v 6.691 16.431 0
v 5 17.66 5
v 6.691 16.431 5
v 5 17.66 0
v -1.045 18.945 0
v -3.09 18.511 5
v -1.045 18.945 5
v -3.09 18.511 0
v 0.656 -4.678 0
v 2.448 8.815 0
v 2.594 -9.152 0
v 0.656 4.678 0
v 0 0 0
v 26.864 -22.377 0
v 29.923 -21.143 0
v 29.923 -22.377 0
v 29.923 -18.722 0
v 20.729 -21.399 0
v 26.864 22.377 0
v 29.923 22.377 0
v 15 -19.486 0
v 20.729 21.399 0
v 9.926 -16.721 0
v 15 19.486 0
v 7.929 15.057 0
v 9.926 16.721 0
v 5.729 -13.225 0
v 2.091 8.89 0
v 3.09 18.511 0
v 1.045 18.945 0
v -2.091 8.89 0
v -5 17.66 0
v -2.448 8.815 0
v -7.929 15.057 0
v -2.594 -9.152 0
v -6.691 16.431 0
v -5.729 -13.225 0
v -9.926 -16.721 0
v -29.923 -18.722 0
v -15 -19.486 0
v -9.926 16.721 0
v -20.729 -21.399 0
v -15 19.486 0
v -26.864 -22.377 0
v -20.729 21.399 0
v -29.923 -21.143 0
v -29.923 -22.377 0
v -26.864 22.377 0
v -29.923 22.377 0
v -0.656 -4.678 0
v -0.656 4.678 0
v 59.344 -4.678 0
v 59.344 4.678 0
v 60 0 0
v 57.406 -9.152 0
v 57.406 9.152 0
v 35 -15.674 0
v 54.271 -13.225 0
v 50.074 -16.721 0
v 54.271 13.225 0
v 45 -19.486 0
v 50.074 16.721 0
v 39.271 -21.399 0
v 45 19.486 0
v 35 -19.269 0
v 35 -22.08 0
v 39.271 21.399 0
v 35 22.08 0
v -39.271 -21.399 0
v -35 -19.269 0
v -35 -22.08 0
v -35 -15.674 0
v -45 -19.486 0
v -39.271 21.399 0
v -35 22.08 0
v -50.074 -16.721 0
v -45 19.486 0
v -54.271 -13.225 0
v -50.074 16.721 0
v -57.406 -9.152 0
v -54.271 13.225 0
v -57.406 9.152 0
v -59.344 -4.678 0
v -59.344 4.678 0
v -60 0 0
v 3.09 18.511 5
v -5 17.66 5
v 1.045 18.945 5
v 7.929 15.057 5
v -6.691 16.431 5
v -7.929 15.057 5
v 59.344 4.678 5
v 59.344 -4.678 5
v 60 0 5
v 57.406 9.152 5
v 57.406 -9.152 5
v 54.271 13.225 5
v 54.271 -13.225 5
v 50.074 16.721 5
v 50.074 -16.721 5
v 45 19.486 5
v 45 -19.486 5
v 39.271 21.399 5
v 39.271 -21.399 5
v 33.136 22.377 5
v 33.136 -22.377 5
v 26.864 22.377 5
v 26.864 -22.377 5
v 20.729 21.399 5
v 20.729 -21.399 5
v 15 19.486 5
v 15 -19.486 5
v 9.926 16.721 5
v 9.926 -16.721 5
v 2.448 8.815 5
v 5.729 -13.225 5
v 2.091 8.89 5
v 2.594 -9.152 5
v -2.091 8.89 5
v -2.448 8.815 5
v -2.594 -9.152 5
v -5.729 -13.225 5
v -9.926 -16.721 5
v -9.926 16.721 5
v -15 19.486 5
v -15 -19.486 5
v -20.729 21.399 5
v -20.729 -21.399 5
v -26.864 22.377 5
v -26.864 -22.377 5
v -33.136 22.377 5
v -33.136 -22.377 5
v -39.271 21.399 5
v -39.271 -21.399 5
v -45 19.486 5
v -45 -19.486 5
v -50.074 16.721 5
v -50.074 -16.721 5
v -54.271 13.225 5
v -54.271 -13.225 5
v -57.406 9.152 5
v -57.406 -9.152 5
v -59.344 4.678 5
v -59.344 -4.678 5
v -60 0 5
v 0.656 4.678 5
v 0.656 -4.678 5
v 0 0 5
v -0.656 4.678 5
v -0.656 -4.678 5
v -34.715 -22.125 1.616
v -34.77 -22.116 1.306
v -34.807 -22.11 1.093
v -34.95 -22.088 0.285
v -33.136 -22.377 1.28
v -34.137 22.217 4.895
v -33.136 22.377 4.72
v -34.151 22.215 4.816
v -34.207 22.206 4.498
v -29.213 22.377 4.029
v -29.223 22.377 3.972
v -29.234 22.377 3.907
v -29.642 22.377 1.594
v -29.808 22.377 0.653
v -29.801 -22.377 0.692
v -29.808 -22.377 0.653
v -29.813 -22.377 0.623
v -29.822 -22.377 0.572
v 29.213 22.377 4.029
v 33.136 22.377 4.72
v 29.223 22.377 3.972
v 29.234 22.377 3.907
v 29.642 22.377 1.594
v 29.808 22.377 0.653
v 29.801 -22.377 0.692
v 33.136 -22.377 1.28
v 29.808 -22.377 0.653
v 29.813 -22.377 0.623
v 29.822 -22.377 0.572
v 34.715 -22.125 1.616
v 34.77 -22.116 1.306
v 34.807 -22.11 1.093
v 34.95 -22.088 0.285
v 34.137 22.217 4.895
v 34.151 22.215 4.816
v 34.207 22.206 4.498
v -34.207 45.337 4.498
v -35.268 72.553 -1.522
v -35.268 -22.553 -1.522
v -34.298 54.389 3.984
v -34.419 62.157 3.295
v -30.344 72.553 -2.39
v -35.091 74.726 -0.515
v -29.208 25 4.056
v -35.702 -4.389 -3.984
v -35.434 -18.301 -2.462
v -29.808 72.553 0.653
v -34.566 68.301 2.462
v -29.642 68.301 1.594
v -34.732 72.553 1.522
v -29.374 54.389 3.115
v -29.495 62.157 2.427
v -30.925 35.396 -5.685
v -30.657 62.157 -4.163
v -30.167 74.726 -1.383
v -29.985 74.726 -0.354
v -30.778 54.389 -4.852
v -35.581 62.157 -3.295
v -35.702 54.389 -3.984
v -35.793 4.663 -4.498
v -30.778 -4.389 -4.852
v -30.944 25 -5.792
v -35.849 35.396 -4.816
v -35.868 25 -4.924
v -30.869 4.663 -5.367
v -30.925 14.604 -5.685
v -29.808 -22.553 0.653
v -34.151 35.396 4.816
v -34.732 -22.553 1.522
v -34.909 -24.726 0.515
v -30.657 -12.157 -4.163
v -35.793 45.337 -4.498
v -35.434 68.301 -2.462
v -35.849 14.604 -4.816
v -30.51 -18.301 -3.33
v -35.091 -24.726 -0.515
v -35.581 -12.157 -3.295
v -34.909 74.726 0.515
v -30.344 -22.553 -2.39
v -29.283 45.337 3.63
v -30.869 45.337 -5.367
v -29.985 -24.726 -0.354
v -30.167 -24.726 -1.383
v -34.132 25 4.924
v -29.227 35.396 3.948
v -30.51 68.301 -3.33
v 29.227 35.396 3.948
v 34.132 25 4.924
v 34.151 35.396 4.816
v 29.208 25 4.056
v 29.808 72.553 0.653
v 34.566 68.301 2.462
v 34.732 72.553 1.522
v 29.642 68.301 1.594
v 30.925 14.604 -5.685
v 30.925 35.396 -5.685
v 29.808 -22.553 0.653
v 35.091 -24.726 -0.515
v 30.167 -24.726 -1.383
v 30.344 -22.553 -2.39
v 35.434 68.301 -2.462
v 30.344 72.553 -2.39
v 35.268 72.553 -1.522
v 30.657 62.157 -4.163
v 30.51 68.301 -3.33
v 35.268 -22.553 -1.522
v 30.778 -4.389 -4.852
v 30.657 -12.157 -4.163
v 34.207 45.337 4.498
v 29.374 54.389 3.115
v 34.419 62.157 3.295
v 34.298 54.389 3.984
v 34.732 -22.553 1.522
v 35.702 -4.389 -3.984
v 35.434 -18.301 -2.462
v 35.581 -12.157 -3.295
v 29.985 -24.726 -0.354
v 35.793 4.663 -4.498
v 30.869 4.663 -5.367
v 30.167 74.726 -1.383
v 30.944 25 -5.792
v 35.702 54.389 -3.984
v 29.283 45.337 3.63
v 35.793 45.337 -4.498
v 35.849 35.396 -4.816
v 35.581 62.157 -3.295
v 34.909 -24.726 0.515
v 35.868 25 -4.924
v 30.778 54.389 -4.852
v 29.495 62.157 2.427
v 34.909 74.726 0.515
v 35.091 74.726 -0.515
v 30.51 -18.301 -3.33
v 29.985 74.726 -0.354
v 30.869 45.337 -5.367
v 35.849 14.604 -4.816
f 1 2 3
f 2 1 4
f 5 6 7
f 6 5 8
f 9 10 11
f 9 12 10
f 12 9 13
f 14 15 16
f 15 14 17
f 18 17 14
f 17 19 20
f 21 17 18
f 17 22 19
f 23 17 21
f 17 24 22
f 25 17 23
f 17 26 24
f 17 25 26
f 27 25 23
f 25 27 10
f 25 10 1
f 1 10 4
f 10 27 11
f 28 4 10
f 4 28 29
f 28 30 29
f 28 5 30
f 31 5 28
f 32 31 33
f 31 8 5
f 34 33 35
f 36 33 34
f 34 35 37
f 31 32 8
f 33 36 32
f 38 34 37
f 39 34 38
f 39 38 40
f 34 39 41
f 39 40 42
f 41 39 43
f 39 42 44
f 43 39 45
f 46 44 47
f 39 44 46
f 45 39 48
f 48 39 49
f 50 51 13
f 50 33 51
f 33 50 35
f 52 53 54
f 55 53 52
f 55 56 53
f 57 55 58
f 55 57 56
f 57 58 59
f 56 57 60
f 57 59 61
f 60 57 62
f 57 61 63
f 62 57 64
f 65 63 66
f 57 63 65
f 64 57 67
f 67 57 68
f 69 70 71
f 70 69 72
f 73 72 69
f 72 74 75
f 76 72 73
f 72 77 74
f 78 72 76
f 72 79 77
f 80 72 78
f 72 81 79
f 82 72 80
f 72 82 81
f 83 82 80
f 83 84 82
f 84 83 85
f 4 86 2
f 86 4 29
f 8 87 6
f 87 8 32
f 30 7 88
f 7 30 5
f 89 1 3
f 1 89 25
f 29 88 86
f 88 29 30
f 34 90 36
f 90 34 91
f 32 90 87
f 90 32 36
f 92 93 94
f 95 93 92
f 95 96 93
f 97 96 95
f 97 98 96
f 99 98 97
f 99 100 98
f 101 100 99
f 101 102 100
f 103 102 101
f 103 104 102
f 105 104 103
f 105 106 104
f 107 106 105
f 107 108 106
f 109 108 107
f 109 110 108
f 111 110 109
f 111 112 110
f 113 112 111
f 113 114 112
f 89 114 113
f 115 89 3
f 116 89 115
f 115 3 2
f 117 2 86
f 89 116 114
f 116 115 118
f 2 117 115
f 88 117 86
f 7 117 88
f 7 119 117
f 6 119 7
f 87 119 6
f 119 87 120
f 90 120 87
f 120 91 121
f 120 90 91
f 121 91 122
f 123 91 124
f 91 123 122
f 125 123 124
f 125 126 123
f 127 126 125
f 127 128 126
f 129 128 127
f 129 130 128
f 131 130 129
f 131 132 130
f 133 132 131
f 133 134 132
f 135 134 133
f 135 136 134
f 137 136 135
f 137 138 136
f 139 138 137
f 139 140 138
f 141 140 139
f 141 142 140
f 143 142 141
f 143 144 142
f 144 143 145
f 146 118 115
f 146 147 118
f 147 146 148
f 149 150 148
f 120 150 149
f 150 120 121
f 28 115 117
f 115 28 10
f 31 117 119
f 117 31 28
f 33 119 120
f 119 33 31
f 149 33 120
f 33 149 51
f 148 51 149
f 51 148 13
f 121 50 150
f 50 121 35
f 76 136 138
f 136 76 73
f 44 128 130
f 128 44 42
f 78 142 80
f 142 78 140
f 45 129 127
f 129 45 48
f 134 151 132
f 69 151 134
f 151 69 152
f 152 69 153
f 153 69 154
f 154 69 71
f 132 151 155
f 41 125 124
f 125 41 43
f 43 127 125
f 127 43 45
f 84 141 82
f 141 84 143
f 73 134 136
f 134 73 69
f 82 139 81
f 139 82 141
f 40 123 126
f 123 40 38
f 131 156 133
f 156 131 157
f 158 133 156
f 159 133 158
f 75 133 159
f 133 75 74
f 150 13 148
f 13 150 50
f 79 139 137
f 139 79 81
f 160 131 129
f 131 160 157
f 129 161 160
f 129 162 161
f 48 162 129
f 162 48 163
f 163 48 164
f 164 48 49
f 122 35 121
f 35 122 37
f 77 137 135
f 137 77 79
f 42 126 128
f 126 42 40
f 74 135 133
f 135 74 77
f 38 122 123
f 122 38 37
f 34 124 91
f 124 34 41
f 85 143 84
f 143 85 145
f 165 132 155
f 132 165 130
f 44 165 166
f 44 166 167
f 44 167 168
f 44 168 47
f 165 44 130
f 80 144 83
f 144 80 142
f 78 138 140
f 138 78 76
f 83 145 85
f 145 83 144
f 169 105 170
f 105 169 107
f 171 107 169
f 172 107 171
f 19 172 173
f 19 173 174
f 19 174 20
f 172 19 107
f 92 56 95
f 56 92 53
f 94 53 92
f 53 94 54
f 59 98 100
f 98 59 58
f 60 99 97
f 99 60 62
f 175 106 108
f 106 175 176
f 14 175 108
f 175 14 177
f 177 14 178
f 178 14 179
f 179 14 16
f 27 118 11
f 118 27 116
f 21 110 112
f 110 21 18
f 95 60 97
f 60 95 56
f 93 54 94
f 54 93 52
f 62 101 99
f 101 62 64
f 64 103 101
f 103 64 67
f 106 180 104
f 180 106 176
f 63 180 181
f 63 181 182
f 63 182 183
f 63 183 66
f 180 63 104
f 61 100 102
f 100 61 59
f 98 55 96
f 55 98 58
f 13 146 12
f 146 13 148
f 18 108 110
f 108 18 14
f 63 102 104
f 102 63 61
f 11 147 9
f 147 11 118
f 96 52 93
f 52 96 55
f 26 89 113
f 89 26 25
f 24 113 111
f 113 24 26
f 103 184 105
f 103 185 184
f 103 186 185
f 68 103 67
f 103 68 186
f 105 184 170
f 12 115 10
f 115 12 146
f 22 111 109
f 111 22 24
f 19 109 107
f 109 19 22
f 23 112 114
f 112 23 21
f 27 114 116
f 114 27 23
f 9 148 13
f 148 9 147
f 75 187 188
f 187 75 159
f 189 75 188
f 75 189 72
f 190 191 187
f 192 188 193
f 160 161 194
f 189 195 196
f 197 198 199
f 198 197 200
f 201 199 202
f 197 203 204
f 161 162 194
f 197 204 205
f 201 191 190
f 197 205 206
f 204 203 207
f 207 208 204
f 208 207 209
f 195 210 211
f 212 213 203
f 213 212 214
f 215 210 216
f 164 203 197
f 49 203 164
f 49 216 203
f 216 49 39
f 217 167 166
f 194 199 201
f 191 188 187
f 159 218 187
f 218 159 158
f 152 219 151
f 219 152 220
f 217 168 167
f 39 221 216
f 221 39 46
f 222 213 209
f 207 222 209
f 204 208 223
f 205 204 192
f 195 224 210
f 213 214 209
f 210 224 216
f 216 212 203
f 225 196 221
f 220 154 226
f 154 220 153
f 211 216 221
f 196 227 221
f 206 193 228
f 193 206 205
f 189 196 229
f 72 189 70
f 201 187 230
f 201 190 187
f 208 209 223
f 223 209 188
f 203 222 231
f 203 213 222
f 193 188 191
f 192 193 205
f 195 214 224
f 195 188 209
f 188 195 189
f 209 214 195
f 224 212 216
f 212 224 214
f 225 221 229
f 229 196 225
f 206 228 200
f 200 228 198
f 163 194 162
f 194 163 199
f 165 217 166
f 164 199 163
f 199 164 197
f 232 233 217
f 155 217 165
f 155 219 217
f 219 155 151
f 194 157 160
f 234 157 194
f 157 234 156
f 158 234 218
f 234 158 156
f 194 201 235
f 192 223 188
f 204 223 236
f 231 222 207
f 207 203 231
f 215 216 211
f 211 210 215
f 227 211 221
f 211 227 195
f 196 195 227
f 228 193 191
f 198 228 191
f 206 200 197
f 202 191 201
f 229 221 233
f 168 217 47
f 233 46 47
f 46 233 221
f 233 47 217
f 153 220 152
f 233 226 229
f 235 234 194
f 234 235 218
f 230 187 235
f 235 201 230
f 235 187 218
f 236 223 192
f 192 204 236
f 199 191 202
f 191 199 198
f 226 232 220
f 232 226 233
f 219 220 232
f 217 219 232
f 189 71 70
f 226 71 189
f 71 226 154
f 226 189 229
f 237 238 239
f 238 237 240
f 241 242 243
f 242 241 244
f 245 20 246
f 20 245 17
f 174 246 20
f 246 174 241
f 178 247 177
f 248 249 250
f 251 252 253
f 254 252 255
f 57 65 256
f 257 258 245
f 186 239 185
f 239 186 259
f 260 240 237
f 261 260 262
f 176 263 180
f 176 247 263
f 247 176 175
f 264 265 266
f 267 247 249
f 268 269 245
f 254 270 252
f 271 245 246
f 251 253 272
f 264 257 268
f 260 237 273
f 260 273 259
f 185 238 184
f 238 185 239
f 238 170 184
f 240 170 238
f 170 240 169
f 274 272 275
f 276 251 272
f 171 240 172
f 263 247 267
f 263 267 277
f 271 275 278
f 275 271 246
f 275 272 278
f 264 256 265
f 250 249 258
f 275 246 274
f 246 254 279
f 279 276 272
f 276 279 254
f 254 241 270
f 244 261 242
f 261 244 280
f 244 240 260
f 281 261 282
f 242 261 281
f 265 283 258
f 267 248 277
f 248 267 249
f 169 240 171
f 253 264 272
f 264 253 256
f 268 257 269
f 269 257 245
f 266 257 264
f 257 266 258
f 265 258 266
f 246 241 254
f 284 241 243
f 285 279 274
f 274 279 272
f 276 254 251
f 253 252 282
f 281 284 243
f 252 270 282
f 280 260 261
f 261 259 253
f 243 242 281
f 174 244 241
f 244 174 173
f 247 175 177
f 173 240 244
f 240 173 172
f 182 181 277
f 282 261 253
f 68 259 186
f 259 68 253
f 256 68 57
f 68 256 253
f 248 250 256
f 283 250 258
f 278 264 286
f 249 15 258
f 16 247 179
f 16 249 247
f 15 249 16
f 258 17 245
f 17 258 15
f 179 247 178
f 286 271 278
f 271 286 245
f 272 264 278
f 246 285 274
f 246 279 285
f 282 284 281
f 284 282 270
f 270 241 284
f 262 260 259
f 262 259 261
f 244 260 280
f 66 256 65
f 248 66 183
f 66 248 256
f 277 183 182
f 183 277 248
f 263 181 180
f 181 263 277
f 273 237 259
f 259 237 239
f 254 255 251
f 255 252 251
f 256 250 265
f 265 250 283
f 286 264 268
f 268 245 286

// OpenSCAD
union() {
	translate(v = [-30.0000000000, 0, 0]) {
		scale(v = [0.6000000000, 0.4500000000, 1]) {
			cylinder(h = 5, r = 50);
		}
	}
	translate(v = [30.0000000000, 0, 0]) {
		scale(v = [0.6000000000, 0.4500000000, 1]) {
			cylinder(h = 5, r = 50);
		}
	}
	translate(v = [0, 9.0000000000, 0]) {
		difference() {
			cylinder(h = 5, r = 10.0000000000);
			translate(v = [0, -20, 0]) {
				cylinder(h = 5, r = 20);
			}
		}
	}
	translate(v = [-35.0000000000, 25.0000000000, 0]) {
		rotate(a = [0, 100, 0]) {
			scale(v = [0.1000000000, 1, 1]) {
				cylinder(h = 5, r = 50.0000000000);
			}
		}
	}
	translate(v = [35.0000000000, 25.0000000000, 0]) {
		rotate(a = [0, -100, 0]) {
			scale(v = [0.1000000000, 1, 1]) {
				cylinder(h = 5, r = 50.0000000000);
			}
		}
	}
}
